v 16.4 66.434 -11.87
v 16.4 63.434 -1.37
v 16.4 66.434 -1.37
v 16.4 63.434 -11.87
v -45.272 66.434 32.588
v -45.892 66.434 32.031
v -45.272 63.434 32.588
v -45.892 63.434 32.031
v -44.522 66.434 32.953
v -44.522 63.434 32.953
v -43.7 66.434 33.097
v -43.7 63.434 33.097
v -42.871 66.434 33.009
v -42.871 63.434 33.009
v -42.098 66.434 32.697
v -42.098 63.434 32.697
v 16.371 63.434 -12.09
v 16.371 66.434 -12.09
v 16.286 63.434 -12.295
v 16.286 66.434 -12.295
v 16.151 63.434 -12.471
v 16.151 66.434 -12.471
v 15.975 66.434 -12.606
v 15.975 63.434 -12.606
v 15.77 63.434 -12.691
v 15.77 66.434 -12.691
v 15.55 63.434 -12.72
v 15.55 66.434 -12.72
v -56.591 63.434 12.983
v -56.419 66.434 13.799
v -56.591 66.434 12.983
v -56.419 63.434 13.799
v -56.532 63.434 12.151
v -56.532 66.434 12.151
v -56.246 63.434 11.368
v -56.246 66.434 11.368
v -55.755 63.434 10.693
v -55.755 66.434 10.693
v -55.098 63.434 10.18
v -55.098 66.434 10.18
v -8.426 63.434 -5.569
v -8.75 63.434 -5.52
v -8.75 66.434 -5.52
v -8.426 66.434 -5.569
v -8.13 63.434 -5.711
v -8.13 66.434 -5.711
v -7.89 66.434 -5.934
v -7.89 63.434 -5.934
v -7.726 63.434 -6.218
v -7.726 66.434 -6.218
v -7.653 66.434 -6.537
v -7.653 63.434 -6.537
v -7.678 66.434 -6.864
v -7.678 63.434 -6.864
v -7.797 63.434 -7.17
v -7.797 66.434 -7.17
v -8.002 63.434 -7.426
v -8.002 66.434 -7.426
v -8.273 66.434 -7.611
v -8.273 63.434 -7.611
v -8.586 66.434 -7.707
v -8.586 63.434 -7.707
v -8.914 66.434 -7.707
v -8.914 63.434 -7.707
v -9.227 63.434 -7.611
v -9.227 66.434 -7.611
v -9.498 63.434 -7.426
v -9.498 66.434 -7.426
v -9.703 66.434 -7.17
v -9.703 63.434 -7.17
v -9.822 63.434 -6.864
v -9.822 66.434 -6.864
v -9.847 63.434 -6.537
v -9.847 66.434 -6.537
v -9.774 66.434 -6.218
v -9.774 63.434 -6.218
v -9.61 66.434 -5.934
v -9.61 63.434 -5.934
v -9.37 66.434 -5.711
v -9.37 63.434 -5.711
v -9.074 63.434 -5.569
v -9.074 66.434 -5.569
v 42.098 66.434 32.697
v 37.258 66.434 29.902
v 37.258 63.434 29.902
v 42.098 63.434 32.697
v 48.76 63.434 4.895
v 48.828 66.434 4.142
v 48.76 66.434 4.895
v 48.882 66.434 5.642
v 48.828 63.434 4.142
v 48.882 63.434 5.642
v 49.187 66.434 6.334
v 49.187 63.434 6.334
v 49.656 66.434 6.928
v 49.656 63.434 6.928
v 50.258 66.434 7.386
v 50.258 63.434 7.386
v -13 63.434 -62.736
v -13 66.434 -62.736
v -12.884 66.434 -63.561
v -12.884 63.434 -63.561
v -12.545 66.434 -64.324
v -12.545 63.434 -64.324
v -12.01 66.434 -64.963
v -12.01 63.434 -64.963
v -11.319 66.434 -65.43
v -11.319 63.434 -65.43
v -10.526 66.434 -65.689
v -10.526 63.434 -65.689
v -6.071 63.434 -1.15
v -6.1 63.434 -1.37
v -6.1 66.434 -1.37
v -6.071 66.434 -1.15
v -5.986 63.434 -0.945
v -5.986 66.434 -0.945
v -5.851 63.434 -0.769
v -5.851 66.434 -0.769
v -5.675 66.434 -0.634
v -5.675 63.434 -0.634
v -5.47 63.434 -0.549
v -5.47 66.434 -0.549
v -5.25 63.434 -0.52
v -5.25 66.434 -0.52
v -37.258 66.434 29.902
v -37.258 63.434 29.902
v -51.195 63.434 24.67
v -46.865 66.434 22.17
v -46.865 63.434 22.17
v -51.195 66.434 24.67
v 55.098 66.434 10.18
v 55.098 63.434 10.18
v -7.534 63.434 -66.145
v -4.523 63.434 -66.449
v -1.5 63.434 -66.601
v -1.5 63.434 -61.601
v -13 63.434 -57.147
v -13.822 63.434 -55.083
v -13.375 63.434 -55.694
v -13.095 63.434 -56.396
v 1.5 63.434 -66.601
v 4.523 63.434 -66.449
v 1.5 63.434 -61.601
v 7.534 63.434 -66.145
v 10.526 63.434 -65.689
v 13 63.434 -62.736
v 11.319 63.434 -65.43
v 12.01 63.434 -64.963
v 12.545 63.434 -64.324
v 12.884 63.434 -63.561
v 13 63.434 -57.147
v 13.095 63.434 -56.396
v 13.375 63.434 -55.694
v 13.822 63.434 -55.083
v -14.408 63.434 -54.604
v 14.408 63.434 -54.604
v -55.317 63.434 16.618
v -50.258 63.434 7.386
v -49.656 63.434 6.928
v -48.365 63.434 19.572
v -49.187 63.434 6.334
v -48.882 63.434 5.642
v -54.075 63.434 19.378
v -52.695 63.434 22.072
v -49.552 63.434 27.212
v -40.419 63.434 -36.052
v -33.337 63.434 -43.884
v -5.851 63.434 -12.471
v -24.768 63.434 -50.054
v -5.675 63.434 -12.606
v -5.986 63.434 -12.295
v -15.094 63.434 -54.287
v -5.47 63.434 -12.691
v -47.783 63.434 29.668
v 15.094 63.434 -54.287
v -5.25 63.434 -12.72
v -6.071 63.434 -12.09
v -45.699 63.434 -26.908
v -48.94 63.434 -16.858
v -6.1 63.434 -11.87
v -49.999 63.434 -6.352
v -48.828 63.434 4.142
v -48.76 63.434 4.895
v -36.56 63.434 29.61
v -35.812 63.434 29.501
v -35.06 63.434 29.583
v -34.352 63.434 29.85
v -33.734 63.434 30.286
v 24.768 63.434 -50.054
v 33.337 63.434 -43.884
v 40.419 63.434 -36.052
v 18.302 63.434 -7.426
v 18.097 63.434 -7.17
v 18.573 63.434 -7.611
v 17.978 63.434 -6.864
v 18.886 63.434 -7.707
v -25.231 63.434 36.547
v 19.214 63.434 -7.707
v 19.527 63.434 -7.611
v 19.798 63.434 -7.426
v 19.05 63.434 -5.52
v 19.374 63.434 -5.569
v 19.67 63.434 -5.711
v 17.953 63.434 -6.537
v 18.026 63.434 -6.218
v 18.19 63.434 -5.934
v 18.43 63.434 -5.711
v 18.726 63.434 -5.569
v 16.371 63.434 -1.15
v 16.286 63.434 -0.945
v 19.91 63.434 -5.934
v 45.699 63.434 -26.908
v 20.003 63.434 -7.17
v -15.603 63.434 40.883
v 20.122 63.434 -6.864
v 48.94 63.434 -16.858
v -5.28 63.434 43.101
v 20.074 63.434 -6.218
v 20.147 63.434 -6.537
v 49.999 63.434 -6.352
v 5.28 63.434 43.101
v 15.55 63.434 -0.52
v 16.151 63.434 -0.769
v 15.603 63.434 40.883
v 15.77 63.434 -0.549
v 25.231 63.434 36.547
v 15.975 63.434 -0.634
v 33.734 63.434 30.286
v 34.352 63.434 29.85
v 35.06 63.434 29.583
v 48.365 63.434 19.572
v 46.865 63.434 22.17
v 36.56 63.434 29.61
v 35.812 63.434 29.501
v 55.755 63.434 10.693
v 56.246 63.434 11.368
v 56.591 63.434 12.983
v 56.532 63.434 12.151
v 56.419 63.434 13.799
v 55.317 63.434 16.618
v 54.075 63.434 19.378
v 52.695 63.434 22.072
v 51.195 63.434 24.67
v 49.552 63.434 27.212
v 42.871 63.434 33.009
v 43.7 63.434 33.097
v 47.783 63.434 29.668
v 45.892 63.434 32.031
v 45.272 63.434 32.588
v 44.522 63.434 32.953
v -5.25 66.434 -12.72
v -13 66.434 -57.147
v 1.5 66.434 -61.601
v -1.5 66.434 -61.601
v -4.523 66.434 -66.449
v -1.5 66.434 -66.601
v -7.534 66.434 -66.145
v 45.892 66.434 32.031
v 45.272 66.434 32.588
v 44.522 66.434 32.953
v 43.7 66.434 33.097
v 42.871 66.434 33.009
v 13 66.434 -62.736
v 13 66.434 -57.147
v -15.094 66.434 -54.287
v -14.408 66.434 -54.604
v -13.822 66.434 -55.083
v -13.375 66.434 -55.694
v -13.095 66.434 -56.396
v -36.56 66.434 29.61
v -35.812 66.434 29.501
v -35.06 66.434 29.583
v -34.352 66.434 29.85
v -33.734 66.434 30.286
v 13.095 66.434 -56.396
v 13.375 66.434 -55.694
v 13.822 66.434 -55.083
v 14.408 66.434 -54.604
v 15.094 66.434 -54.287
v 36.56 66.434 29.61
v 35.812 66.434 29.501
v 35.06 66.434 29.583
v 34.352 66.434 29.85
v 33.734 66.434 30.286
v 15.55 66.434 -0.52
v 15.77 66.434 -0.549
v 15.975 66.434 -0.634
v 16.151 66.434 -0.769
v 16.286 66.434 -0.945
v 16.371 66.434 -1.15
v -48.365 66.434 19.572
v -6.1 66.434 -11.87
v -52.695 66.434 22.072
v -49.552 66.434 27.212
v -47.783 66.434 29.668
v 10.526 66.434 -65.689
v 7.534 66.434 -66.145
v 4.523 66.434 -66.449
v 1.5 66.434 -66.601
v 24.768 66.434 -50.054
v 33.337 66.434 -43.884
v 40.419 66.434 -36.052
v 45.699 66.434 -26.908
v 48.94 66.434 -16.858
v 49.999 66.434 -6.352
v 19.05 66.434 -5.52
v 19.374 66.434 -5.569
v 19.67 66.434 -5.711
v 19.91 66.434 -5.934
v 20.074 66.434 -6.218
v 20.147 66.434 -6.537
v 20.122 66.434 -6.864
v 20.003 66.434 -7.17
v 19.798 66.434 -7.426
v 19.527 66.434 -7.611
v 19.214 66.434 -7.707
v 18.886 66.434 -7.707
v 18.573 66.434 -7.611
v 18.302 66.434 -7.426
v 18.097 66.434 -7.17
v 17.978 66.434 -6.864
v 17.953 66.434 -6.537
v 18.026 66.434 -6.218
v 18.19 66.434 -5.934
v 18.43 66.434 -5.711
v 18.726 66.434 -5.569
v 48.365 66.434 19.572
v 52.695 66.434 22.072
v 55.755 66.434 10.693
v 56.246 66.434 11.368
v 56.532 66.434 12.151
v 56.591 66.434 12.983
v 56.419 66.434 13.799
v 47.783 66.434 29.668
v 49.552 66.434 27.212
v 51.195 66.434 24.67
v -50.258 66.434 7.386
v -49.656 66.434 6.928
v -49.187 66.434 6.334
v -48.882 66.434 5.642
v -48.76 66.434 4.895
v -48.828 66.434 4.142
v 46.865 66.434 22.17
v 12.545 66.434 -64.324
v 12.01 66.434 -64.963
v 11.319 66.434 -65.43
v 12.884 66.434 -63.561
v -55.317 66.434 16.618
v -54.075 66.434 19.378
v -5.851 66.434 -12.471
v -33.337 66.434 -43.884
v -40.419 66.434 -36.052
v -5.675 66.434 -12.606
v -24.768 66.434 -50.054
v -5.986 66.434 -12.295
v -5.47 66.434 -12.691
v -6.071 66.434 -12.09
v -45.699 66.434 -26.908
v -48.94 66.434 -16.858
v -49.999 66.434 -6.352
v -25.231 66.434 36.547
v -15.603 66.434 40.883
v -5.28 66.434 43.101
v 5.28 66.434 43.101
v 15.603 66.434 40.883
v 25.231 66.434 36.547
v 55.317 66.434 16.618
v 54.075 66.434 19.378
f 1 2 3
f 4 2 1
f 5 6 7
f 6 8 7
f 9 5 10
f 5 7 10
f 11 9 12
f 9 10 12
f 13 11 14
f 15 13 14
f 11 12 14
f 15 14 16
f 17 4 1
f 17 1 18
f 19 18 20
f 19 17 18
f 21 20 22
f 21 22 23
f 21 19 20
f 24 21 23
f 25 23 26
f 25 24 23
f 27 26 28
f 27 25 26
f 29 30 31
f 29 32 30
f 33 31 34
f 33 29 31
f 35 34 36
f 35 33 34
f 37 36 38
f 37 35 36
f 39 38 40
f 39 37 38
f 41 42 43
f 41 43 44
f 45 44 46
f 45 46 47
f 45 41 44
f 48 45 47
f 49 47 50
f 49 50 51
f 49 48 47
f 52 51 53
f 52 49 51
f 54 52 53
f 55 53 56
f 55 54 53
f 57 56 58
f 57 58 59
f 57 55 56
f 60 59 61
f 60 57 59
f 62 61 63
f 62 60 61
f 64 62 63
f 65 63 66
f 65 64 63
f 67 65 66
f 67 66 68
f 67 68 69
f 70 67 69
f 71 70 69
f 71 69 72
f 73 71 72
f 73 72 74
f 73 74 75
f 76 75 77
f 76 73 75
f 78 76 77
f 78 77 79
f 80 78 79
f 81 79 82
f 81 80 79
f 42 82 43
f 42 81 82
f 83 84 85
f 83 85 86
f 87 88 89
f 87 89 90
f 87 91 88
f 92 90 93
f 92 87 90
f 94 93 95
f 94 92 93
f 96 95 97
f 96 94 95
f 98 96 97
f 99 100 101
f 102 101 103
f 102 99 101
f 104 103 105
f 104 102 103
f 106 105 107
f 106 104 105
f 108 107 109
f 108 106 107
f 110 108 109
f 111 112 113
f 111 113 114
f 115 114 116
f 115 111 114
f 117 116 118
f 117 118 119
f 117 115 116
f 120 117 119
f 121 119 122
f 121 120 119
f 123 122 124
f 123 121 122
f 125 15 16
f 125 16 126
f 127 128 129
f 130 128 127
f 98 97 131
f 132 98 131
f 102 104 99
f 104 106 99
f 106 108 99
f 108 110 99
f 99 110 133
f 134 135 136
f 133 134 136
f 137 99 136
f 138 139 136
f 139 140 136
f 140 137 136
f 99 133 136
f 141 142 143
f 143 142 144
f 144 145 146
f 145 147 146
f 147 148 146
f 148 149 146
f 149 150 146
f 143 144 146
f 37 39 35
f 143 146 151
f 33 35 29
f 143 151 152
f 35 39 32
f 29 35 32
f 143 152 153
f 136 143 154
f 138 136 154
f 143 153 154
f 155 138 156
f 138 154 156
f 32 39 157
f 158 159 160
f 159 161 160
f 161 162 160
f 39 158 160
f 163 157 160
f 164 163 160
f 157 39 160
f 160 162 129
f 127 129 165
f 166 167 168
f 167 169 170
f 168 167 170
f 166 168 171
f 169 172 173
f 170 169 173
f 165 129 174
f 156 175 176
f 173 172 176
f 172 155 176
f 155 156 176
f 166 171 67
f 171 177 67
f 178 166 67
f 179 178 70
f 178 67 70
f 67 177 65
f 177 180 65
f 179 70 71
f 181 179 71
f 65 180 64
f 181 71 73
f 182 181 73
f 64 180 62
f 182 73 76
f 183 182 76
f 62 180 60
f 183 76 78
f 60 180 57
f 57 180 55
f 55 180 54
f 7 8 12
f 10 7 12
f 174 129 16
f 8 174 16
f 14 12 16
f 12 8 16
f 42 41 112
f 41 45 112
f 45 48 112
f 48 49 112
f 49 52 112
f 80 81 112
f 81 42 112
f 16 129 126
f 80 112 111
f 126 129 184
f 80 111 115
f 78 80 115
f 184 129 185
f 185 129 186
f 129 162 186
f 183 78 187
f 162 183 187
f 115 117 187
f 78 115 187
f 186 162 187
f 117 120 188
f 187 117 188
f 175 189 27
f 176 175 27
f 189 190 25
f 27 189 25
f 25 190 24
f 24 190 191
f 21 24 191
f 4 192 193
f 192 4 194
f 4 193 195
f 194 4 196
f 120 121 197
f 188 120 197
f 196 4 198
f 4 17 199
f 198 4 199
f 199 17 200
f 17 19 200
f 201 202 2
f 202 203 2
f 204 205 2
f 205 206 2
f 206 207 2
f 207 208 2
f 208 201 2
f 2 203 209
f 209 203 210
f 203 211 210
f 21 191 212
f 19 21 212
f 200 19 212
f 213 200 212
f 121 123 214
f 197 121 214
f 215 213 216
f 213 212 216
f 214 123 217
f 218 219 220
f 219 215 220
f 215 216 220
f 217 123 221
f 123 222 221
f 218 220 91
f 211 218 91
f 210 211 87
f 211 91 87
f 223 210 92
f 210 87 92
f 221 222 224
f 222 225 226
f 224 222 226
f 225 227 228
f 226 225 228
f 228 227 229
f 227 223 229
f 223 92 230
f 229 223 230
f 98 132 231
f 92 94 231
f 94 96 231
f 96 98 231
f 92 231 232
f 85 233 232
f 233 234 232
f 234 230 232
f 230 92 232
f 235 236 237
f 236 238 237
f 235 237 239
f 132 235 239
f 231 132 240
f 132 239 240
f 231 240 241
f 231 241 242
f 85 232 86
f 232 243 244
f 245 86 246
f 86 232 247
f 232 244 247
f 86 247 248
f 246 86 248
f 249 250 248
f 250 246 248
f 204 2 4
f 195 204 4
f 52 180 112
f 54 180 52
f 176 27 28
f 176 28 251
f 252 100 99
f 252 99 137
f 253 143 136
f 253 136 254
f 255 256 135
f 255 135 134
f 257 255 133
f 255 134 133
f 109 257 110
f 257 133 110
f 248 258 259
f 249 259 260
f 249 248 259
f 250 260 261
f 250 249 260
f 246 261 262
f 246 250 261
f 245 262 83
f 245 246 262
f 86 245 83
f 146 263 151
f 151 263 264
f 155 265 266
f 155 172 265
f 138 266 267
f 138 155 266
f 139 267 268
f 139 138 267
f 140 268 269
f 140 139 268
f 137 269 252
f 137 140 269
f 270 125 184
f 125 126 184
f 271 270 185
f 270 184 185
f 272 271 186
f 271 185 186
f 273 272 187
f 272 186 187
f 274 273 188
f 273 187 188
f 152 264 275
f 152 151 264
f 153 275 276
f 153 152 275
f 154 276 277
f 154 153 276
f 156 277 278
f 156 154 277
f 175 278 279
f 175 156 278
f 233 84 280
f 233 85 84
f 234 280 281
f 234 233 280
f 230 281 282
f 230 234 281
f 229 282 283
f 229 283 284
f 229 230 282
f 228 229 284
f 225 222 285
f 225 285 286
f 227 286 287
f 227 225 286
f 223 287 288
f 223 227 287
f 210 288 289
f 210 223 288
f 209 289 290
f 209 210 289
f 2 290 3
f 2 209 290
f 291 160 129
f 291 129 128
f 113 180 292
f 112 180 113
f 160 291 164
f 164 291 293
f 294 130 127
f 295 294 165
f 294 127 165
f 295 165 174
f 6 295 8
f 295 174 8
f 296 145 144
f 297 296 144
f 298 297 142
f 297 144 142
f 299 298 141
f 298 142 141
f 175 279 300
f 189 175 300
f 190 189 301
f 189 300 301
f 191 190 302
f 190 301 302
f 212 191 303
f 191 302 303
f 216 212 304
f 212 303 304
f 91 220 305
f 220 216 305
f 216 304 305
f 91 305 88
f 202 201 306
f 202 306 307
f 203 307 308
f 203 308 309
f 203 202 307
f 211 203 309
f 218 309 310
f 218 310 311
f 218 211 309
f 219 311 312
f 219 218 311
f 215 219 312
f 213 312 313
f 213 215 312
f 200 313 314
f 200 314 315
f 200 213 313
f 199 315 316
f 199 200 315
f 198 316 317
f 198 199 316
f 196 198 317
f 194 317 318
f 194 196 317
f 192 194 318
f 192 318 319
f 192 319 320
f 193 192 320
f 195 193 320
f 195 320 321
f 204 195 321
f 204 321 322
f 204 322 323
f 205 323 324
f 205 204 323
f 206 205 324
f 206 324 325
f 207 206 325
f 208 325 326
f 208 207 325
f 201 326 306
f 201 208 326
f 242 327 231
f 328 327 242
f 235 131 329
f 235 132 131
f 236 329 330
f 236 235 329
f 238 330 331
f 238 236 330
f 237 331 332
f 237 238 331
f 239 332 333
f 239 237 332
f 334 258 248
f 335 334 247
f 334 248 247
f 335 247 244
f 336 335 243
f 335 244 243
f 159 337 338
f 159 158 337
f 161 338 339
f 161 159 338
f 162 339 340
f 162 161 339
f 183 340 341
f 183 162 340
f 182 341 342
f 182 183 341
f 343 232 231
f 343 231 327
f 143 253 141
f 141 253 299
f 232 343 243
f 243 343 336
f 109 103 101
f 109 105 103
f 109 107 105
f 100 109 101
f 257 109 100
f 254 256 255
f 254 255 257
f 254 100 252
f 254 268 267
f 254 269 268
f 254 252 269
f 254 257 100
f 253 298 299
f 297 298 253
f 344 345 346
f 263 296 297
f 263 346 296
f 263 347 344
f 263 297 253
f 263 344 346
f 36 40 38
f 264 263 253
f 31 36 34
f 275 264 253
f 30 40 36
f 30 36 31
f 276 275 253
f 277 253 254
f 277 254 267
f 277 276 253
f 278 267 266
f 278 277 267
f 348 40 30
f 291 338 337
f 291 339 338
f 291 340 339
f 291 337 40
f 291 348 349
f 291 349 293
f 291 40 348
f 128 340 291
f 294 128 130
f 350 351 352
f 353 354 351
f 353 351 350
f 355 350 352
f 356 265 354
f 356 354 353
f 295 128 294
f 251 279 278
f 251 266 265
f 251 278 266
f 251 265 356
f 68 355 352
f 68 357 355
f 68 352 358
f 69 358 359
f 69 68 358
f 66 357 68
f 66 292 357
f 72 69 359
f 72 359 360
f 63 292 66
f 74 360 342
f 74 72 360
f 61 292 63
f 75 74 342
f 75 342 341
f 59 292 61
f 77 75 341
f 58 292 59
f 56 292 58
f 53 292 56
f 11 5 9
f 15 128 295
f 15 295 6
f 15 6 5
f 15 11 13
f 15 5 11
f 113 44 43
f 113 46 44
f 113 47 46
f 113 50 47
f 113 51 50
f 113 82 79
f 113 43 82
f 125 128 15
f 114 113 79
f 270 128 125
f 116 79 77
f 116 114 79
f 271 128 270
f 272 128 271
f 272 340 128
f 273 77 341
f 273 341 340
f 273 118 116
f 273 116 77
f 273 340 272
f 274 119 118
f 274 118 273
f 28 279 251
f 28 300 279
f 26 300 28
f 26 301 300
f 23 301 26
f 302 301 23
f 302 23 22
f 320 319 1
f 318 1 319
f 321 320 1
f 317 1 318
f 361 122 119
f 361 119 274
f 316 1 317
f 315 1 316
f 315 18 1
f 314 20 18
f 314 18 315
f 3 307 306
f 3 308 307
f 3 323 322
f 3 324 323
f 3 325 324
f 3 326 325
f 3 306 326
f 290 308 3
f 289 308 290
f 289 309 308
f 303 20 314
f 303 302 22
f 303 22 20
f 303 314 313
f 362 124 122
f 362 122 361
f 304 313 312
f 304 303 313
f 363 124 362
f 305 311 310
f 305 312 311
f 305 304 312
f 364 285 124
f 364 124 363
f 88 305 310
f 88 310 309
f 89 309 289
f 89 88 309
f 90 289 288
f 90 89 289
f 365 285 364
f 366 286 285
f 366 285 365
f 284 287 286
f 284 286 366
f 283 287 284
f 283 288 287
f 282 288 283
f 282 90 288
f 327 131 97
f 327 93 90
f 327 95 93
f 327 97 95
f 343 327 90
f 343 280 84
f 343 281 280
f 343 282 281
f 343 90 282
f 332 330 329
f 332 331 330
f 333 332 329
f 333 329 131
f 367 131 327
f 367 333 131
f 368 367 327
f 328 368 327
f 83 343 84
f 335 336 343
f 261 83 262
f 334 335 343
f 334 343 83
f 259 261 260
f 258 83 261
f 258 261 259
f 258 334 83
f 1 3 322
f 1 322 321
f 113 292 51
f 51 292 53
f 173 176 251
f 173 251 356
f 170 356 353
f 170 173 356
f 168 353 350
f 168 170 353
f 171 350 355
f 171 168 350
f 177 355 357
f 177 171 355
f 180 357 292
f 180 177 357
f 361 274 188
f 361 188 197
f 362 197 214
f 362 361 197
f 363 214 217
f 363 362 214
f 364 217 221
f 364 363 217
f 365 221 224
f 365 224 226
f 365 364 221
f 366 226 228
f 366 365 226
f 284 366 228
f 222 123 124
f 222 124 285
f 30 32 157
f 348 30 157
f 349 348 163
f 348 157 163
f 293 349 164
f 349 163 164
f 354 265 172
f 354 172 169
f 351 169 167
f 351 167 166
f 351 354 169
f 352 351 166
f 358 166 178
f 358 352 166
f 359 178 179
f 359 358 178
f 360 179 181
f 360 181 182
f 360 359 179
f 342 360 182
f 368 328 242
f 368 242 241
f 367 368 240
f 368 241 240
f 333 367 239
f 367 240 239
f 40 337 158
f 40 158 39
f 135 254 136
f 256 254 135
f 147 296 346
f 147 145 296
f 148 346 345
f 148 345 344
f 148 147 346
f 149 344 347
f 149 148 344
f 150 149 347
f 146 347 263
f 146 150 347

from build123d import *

# Parameters (mm, degrees)
SKETCH1_R           = 60
SKETCH1_R_2         = 1.1
BOSS_EXTRUDE1_DEPTH = 3
SKETCH2_W           = 5.018752931
SKETCH2_H           = 3
CUT_EXTRUDE1_DEPTH  = 1.5
CIRPATTERN1_COUNT   = 3
CUT_EXTRUDE2_REACH  = 91.692
FILLET1_R           = 3


with BuildPart() as part:
    # Sketch1 → Boss-Extrude1 (new body)
    with BuildSketch(Plane(origin=(0, 63.433902084, 0), x_dir=(1, 0, 0), z_dir=(0, 1, 0))):
        with Locations(Location((0, 6.619681527, 0), (0, 0, 270))):
            Circle(SKETCH1_R)
        with Locations(Location((-8.75, 6.619681527, 0), (0, 0, 270))):
            Circle(SKETCH1_R_2, mode=Mode.SUBTRACT)
        with Locations(Location((19.05, 6.619681527, 0), (0, 0, 270))):
            Circle(SKETCH1_R_2, mode=Mode.SUBTRACT)
        with BuildLine():
            Line((1.562049935, 12.719681527), (0, 12.719681527))
            Line((0, 12.719681527), (-1.562049935, 12.719681527))
            Line((-1.562049935, 12.719681527), (-5.25, 12.719681527))
            ThreePointArc((-5.25, 12.719681527), (-5.851040764, 12.470722291), (-6.1, 11.869681527))
            Line((-6.1, 11.869681527), (-6.1, 8.181731462))
            Line((-6.1, 8.181731462), (-6.1, 6.619681527))
            Line((-6.1, 6.619681527), (-6.1, 5.057631592))
            Line((-6.1, 5.057631592), (-6.1, 1.369681527))
            ThreePointArc((-6.1, 1.369681527), (-5.851040764, 0.768640763), (-5.25, 0.519681527))
            Line((-5.25, 0.519681527), (-1.562049935, 0.519681527))
            Line((-1.562049935, 0.519681527), (0, 0.519681527))
            Line((0, 0.519681527), (1.562049935, 0.519681527))
            Line((1.562049935, 0.519681527), (15.55, 0.519681527))
            ThreePointArc((15.55, 0.519681527), (16.151040764, 0.768640763), (16.4, 1.369681527))
            Line((16.4, 1.369681527), (16.4, 11.869681527))
            ThreePointArc((16.4, 11.869681527), (16.151040764, 12.470722291), (15.55, 12.719681527))
            Line((15.55, 12.719681527), (1.562049935, 12.719681527))
        make_face(mode=Mode.SUBTRACT)
    extrude(amount=BOSS_EXTRUDE1_DEPTH)

    # Sketch2 → Cut-Extrude1 (cut, symmetric)
    with BuildSketch(Plane(origin=(0, 0, 0), x_dir=(0, 0, -1), z_dir=(1, 0, 0))):
        with Locations((64.110305062, 64.933902084)):
            Rectangle(SKETCH2_W, SKETCH2_H)
    cut_extrude1 = extrude(amount=CUT_EXTRUDE1_DEPTH, both=True, mode=Mode.SUBTRACT)

    # CirPattern1: Cut-Extrude1 ×3 about axis
    cirpattern1_axis = Axis((0, 0, -6.619681527), (0, 1, 0))
    for i in range(1, CIRPATTERN1_COUNT):
        add(cut_extrude1.rotate(cirpattern1_axis, i * 360 / CIRPATTERN1_COUNT), mode=Mode.SUBTRACT)

    # Sketch3 → Cut-Extrude2 (cut, up to next)
    with BuildSketch(Plane(origin=(0, 66.433902084, 0), x_dir=(1, 0, 0), z_dir=(0, 1, 0)), mode=Mode.PRIVATE) as cut_extrude2_sk1:
        with BuildLine():
            Line((35.312079594, -28.778864132), (44.227211632, -33.926018014))
            ThreePointArc((44.227211632, -33.926018014), (0, -53.380318473), (-44.227211632, -33.926018014))
            Line((-44.227211632, -33.926018014), (-35.312079594, -28.778864132))
            ThreePointArc((-35.312079594, -28.778864132), (0, -43.380318473), (35.312079594, -28.778864132))
        make_face()
    cut_extrude2_tool1 = extrude(cut_extrude2_sk1.sketch, amount=-CUT_EXTRUDE2_REACH, mode=Mode.PRIVATE) & part.part
    # Sketch3 → Cut-Extrude2 (cut, up to next)
    with BuildSketch(Plane(origin=(0, 66.433902084, 0), x_dir=(1, 0, 0), z_dir=(0, 1, 0)), mode=Mode.PRIVATE) as cut_extrude2_sk2:
        with BuildLine():
            Line((48.312079594, -6.262203633), (57.227211632, -11.409357515))
            ThreePointArc((57.227211632, -11.409357515), (51.961524227, 36.619681527), (13, 65.194420109))
            Line((13, 65.194420109), (13, 54.900112345))
            ThreePointArc((13, 54.900112345), (43.301270189, 31.619681527), (48.312079594, -6.262203633))
        make_face()
    cut_extrude2_tool2 = extrude(cut_extrude2_sk2.sketch, amount=-CUT_EXTRUDE2_REACH, mode=Mode.PRIVATE) & part.part
    # Sketch3 → Cut-Extrude2 (cut, up to next)
    with BuildSketch(Plane(origin=(0, 66.433902084, 0), x_dir=(1, 0, 0), z_dir=(0, 1, 0)), mode=Mode.PRIVATE) as cut_extrude2_sk3:
        with BuildLine():
            Line((-48.312079594, -6.262203633), (-57.227211632, -11.409357515))
            ThreePointArc((-57.227211632, -11.409357515), (-51.961524227, 36.619681527), (-13, 65.194420109))
            Line((-13, 65.194420109), (-13, 54.900112345))
            ThreePointArc((-13, 54.900112345), (-43.301270189, 31.619681527), (-48.312079594, -6.262203633))
        make_face()
    cut_extrude2_tool3 = extrude(cut_extrude2_sk3.sketch, amount=-CUT_EXTRUDE2_REACH, mode=Mode.PRIVATE) & part.part
    add(cut_extrude2_tool1.solids().sort_by_distance((0, 66.433902, 52.4622))[0], mode=Mode.SUBTRACT)
    add(cut_extrude2_tool2.solids().sort_by_distance((53.21901, 66.433902, 8.057458))[0], mode=Mode.SUBTRACT)
    add(cut_extrude2_tool3.solids().sort_by_distance((-13.898729, 66.433902, -60.047266))[0], mode=Mode.SUBTRACT)

    # Fillet1
    fillet1_edges = [part.edges().sort_by_distance(p)[0] for p in [
        (-13, 64.933902084, -54.900112345),
        (-48.312079594, 64.933902084, 6.262203633),
        (-57.227211632, 64.933902084, 11.409357515),
        (-13, 64.933902084, -65.194420109),
        (-35.312079594, 64.933902084, 28.778864132),
        (35.312079594, 64.933902084, 28.778864132),
        (44.227211632, 64.933902084, 33.926018014),
        (-44.227211632, 64.933902084, 33.926018014),
        (48.312079594, 64.933902084, 6.262203633),
        (13, 64.933902084, -54.900112345),
        (13, 64.933902084, -65.194420109),
        (57.227211632, 64.933902084, 11.409357515),
    ]]
    fillet(fillet1_edges, radius=FILLET1_R)


solid = part.part
